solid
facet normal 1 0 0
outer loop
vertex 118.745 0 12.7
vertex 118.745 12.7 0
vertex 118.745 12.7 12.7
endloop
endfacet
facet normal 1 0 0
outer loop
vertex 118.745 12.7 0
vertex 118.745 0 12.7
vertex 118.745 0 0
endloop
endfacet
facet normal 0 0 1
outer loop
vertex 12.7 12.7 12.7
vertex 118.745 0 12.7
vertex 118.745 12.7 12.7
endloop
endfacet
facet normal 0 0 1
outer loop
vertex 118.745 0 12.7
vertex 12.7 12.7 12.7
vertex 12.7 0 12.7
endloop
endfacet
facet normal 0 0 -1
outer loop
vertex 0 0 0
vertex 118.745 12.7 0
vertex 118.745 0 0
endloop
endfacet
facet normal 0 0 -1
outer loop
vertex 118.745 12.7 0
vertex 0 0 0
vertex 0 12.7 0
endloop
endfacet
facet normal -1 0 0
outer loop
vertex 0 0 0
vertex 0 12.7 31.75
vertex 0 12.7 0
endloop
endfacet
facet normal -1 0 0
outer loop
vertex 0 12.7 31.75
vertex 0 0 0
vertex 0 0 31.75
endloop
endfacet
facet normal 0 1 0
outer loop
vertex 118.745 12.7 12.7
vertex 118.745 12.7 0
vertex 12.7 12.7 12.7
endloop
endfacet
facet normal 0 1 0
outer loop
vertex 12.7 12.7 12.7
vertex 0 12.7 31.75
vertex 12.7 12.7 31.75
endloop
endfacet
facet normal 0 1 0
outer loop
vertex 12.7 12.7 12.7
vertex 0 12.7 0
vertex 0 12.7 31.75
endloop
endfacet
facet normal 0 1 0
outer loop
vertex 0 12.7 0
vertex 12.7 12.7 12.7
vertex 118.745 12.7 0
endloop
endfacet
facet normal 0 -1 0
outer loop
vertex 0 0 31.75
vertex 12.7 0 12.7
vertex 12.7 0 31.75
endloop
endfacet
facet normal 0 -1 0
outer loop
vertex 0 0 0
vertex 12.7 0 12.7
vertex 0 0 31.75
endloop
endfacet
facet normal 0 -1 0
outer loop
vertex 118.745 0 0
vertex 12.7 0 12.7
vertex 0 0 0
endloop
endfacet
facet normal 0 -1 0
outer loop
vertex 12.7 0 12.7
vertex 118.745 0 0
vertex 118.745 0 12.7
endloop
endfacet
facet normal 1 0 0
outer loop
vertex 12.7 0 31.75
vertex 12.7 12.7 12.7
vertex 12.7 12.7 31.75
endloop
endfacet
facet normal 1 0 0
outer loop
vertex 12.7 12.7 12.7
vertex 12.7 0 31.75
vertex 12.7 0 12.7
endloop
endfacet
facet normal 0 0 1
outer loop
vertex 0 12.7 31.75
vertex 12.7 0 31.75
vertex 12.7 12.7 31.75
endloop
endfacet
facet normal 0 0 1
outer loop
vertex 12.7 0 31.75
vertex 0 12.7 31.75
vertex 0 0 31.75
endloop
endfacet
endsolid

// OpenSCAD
//
// We need two of those
//

$fn = 64;

$in     = 25.4; // everything in inches

$length = 4.675 * $in;
$width  = 0.5   * $in;
$thick  = 0.5   * $in;
$extent = 1.25  * $in;

union() {
    cube( [ $length, $width, $thick ] );
    cube( [ $thick, $width, $extent ] );
}
